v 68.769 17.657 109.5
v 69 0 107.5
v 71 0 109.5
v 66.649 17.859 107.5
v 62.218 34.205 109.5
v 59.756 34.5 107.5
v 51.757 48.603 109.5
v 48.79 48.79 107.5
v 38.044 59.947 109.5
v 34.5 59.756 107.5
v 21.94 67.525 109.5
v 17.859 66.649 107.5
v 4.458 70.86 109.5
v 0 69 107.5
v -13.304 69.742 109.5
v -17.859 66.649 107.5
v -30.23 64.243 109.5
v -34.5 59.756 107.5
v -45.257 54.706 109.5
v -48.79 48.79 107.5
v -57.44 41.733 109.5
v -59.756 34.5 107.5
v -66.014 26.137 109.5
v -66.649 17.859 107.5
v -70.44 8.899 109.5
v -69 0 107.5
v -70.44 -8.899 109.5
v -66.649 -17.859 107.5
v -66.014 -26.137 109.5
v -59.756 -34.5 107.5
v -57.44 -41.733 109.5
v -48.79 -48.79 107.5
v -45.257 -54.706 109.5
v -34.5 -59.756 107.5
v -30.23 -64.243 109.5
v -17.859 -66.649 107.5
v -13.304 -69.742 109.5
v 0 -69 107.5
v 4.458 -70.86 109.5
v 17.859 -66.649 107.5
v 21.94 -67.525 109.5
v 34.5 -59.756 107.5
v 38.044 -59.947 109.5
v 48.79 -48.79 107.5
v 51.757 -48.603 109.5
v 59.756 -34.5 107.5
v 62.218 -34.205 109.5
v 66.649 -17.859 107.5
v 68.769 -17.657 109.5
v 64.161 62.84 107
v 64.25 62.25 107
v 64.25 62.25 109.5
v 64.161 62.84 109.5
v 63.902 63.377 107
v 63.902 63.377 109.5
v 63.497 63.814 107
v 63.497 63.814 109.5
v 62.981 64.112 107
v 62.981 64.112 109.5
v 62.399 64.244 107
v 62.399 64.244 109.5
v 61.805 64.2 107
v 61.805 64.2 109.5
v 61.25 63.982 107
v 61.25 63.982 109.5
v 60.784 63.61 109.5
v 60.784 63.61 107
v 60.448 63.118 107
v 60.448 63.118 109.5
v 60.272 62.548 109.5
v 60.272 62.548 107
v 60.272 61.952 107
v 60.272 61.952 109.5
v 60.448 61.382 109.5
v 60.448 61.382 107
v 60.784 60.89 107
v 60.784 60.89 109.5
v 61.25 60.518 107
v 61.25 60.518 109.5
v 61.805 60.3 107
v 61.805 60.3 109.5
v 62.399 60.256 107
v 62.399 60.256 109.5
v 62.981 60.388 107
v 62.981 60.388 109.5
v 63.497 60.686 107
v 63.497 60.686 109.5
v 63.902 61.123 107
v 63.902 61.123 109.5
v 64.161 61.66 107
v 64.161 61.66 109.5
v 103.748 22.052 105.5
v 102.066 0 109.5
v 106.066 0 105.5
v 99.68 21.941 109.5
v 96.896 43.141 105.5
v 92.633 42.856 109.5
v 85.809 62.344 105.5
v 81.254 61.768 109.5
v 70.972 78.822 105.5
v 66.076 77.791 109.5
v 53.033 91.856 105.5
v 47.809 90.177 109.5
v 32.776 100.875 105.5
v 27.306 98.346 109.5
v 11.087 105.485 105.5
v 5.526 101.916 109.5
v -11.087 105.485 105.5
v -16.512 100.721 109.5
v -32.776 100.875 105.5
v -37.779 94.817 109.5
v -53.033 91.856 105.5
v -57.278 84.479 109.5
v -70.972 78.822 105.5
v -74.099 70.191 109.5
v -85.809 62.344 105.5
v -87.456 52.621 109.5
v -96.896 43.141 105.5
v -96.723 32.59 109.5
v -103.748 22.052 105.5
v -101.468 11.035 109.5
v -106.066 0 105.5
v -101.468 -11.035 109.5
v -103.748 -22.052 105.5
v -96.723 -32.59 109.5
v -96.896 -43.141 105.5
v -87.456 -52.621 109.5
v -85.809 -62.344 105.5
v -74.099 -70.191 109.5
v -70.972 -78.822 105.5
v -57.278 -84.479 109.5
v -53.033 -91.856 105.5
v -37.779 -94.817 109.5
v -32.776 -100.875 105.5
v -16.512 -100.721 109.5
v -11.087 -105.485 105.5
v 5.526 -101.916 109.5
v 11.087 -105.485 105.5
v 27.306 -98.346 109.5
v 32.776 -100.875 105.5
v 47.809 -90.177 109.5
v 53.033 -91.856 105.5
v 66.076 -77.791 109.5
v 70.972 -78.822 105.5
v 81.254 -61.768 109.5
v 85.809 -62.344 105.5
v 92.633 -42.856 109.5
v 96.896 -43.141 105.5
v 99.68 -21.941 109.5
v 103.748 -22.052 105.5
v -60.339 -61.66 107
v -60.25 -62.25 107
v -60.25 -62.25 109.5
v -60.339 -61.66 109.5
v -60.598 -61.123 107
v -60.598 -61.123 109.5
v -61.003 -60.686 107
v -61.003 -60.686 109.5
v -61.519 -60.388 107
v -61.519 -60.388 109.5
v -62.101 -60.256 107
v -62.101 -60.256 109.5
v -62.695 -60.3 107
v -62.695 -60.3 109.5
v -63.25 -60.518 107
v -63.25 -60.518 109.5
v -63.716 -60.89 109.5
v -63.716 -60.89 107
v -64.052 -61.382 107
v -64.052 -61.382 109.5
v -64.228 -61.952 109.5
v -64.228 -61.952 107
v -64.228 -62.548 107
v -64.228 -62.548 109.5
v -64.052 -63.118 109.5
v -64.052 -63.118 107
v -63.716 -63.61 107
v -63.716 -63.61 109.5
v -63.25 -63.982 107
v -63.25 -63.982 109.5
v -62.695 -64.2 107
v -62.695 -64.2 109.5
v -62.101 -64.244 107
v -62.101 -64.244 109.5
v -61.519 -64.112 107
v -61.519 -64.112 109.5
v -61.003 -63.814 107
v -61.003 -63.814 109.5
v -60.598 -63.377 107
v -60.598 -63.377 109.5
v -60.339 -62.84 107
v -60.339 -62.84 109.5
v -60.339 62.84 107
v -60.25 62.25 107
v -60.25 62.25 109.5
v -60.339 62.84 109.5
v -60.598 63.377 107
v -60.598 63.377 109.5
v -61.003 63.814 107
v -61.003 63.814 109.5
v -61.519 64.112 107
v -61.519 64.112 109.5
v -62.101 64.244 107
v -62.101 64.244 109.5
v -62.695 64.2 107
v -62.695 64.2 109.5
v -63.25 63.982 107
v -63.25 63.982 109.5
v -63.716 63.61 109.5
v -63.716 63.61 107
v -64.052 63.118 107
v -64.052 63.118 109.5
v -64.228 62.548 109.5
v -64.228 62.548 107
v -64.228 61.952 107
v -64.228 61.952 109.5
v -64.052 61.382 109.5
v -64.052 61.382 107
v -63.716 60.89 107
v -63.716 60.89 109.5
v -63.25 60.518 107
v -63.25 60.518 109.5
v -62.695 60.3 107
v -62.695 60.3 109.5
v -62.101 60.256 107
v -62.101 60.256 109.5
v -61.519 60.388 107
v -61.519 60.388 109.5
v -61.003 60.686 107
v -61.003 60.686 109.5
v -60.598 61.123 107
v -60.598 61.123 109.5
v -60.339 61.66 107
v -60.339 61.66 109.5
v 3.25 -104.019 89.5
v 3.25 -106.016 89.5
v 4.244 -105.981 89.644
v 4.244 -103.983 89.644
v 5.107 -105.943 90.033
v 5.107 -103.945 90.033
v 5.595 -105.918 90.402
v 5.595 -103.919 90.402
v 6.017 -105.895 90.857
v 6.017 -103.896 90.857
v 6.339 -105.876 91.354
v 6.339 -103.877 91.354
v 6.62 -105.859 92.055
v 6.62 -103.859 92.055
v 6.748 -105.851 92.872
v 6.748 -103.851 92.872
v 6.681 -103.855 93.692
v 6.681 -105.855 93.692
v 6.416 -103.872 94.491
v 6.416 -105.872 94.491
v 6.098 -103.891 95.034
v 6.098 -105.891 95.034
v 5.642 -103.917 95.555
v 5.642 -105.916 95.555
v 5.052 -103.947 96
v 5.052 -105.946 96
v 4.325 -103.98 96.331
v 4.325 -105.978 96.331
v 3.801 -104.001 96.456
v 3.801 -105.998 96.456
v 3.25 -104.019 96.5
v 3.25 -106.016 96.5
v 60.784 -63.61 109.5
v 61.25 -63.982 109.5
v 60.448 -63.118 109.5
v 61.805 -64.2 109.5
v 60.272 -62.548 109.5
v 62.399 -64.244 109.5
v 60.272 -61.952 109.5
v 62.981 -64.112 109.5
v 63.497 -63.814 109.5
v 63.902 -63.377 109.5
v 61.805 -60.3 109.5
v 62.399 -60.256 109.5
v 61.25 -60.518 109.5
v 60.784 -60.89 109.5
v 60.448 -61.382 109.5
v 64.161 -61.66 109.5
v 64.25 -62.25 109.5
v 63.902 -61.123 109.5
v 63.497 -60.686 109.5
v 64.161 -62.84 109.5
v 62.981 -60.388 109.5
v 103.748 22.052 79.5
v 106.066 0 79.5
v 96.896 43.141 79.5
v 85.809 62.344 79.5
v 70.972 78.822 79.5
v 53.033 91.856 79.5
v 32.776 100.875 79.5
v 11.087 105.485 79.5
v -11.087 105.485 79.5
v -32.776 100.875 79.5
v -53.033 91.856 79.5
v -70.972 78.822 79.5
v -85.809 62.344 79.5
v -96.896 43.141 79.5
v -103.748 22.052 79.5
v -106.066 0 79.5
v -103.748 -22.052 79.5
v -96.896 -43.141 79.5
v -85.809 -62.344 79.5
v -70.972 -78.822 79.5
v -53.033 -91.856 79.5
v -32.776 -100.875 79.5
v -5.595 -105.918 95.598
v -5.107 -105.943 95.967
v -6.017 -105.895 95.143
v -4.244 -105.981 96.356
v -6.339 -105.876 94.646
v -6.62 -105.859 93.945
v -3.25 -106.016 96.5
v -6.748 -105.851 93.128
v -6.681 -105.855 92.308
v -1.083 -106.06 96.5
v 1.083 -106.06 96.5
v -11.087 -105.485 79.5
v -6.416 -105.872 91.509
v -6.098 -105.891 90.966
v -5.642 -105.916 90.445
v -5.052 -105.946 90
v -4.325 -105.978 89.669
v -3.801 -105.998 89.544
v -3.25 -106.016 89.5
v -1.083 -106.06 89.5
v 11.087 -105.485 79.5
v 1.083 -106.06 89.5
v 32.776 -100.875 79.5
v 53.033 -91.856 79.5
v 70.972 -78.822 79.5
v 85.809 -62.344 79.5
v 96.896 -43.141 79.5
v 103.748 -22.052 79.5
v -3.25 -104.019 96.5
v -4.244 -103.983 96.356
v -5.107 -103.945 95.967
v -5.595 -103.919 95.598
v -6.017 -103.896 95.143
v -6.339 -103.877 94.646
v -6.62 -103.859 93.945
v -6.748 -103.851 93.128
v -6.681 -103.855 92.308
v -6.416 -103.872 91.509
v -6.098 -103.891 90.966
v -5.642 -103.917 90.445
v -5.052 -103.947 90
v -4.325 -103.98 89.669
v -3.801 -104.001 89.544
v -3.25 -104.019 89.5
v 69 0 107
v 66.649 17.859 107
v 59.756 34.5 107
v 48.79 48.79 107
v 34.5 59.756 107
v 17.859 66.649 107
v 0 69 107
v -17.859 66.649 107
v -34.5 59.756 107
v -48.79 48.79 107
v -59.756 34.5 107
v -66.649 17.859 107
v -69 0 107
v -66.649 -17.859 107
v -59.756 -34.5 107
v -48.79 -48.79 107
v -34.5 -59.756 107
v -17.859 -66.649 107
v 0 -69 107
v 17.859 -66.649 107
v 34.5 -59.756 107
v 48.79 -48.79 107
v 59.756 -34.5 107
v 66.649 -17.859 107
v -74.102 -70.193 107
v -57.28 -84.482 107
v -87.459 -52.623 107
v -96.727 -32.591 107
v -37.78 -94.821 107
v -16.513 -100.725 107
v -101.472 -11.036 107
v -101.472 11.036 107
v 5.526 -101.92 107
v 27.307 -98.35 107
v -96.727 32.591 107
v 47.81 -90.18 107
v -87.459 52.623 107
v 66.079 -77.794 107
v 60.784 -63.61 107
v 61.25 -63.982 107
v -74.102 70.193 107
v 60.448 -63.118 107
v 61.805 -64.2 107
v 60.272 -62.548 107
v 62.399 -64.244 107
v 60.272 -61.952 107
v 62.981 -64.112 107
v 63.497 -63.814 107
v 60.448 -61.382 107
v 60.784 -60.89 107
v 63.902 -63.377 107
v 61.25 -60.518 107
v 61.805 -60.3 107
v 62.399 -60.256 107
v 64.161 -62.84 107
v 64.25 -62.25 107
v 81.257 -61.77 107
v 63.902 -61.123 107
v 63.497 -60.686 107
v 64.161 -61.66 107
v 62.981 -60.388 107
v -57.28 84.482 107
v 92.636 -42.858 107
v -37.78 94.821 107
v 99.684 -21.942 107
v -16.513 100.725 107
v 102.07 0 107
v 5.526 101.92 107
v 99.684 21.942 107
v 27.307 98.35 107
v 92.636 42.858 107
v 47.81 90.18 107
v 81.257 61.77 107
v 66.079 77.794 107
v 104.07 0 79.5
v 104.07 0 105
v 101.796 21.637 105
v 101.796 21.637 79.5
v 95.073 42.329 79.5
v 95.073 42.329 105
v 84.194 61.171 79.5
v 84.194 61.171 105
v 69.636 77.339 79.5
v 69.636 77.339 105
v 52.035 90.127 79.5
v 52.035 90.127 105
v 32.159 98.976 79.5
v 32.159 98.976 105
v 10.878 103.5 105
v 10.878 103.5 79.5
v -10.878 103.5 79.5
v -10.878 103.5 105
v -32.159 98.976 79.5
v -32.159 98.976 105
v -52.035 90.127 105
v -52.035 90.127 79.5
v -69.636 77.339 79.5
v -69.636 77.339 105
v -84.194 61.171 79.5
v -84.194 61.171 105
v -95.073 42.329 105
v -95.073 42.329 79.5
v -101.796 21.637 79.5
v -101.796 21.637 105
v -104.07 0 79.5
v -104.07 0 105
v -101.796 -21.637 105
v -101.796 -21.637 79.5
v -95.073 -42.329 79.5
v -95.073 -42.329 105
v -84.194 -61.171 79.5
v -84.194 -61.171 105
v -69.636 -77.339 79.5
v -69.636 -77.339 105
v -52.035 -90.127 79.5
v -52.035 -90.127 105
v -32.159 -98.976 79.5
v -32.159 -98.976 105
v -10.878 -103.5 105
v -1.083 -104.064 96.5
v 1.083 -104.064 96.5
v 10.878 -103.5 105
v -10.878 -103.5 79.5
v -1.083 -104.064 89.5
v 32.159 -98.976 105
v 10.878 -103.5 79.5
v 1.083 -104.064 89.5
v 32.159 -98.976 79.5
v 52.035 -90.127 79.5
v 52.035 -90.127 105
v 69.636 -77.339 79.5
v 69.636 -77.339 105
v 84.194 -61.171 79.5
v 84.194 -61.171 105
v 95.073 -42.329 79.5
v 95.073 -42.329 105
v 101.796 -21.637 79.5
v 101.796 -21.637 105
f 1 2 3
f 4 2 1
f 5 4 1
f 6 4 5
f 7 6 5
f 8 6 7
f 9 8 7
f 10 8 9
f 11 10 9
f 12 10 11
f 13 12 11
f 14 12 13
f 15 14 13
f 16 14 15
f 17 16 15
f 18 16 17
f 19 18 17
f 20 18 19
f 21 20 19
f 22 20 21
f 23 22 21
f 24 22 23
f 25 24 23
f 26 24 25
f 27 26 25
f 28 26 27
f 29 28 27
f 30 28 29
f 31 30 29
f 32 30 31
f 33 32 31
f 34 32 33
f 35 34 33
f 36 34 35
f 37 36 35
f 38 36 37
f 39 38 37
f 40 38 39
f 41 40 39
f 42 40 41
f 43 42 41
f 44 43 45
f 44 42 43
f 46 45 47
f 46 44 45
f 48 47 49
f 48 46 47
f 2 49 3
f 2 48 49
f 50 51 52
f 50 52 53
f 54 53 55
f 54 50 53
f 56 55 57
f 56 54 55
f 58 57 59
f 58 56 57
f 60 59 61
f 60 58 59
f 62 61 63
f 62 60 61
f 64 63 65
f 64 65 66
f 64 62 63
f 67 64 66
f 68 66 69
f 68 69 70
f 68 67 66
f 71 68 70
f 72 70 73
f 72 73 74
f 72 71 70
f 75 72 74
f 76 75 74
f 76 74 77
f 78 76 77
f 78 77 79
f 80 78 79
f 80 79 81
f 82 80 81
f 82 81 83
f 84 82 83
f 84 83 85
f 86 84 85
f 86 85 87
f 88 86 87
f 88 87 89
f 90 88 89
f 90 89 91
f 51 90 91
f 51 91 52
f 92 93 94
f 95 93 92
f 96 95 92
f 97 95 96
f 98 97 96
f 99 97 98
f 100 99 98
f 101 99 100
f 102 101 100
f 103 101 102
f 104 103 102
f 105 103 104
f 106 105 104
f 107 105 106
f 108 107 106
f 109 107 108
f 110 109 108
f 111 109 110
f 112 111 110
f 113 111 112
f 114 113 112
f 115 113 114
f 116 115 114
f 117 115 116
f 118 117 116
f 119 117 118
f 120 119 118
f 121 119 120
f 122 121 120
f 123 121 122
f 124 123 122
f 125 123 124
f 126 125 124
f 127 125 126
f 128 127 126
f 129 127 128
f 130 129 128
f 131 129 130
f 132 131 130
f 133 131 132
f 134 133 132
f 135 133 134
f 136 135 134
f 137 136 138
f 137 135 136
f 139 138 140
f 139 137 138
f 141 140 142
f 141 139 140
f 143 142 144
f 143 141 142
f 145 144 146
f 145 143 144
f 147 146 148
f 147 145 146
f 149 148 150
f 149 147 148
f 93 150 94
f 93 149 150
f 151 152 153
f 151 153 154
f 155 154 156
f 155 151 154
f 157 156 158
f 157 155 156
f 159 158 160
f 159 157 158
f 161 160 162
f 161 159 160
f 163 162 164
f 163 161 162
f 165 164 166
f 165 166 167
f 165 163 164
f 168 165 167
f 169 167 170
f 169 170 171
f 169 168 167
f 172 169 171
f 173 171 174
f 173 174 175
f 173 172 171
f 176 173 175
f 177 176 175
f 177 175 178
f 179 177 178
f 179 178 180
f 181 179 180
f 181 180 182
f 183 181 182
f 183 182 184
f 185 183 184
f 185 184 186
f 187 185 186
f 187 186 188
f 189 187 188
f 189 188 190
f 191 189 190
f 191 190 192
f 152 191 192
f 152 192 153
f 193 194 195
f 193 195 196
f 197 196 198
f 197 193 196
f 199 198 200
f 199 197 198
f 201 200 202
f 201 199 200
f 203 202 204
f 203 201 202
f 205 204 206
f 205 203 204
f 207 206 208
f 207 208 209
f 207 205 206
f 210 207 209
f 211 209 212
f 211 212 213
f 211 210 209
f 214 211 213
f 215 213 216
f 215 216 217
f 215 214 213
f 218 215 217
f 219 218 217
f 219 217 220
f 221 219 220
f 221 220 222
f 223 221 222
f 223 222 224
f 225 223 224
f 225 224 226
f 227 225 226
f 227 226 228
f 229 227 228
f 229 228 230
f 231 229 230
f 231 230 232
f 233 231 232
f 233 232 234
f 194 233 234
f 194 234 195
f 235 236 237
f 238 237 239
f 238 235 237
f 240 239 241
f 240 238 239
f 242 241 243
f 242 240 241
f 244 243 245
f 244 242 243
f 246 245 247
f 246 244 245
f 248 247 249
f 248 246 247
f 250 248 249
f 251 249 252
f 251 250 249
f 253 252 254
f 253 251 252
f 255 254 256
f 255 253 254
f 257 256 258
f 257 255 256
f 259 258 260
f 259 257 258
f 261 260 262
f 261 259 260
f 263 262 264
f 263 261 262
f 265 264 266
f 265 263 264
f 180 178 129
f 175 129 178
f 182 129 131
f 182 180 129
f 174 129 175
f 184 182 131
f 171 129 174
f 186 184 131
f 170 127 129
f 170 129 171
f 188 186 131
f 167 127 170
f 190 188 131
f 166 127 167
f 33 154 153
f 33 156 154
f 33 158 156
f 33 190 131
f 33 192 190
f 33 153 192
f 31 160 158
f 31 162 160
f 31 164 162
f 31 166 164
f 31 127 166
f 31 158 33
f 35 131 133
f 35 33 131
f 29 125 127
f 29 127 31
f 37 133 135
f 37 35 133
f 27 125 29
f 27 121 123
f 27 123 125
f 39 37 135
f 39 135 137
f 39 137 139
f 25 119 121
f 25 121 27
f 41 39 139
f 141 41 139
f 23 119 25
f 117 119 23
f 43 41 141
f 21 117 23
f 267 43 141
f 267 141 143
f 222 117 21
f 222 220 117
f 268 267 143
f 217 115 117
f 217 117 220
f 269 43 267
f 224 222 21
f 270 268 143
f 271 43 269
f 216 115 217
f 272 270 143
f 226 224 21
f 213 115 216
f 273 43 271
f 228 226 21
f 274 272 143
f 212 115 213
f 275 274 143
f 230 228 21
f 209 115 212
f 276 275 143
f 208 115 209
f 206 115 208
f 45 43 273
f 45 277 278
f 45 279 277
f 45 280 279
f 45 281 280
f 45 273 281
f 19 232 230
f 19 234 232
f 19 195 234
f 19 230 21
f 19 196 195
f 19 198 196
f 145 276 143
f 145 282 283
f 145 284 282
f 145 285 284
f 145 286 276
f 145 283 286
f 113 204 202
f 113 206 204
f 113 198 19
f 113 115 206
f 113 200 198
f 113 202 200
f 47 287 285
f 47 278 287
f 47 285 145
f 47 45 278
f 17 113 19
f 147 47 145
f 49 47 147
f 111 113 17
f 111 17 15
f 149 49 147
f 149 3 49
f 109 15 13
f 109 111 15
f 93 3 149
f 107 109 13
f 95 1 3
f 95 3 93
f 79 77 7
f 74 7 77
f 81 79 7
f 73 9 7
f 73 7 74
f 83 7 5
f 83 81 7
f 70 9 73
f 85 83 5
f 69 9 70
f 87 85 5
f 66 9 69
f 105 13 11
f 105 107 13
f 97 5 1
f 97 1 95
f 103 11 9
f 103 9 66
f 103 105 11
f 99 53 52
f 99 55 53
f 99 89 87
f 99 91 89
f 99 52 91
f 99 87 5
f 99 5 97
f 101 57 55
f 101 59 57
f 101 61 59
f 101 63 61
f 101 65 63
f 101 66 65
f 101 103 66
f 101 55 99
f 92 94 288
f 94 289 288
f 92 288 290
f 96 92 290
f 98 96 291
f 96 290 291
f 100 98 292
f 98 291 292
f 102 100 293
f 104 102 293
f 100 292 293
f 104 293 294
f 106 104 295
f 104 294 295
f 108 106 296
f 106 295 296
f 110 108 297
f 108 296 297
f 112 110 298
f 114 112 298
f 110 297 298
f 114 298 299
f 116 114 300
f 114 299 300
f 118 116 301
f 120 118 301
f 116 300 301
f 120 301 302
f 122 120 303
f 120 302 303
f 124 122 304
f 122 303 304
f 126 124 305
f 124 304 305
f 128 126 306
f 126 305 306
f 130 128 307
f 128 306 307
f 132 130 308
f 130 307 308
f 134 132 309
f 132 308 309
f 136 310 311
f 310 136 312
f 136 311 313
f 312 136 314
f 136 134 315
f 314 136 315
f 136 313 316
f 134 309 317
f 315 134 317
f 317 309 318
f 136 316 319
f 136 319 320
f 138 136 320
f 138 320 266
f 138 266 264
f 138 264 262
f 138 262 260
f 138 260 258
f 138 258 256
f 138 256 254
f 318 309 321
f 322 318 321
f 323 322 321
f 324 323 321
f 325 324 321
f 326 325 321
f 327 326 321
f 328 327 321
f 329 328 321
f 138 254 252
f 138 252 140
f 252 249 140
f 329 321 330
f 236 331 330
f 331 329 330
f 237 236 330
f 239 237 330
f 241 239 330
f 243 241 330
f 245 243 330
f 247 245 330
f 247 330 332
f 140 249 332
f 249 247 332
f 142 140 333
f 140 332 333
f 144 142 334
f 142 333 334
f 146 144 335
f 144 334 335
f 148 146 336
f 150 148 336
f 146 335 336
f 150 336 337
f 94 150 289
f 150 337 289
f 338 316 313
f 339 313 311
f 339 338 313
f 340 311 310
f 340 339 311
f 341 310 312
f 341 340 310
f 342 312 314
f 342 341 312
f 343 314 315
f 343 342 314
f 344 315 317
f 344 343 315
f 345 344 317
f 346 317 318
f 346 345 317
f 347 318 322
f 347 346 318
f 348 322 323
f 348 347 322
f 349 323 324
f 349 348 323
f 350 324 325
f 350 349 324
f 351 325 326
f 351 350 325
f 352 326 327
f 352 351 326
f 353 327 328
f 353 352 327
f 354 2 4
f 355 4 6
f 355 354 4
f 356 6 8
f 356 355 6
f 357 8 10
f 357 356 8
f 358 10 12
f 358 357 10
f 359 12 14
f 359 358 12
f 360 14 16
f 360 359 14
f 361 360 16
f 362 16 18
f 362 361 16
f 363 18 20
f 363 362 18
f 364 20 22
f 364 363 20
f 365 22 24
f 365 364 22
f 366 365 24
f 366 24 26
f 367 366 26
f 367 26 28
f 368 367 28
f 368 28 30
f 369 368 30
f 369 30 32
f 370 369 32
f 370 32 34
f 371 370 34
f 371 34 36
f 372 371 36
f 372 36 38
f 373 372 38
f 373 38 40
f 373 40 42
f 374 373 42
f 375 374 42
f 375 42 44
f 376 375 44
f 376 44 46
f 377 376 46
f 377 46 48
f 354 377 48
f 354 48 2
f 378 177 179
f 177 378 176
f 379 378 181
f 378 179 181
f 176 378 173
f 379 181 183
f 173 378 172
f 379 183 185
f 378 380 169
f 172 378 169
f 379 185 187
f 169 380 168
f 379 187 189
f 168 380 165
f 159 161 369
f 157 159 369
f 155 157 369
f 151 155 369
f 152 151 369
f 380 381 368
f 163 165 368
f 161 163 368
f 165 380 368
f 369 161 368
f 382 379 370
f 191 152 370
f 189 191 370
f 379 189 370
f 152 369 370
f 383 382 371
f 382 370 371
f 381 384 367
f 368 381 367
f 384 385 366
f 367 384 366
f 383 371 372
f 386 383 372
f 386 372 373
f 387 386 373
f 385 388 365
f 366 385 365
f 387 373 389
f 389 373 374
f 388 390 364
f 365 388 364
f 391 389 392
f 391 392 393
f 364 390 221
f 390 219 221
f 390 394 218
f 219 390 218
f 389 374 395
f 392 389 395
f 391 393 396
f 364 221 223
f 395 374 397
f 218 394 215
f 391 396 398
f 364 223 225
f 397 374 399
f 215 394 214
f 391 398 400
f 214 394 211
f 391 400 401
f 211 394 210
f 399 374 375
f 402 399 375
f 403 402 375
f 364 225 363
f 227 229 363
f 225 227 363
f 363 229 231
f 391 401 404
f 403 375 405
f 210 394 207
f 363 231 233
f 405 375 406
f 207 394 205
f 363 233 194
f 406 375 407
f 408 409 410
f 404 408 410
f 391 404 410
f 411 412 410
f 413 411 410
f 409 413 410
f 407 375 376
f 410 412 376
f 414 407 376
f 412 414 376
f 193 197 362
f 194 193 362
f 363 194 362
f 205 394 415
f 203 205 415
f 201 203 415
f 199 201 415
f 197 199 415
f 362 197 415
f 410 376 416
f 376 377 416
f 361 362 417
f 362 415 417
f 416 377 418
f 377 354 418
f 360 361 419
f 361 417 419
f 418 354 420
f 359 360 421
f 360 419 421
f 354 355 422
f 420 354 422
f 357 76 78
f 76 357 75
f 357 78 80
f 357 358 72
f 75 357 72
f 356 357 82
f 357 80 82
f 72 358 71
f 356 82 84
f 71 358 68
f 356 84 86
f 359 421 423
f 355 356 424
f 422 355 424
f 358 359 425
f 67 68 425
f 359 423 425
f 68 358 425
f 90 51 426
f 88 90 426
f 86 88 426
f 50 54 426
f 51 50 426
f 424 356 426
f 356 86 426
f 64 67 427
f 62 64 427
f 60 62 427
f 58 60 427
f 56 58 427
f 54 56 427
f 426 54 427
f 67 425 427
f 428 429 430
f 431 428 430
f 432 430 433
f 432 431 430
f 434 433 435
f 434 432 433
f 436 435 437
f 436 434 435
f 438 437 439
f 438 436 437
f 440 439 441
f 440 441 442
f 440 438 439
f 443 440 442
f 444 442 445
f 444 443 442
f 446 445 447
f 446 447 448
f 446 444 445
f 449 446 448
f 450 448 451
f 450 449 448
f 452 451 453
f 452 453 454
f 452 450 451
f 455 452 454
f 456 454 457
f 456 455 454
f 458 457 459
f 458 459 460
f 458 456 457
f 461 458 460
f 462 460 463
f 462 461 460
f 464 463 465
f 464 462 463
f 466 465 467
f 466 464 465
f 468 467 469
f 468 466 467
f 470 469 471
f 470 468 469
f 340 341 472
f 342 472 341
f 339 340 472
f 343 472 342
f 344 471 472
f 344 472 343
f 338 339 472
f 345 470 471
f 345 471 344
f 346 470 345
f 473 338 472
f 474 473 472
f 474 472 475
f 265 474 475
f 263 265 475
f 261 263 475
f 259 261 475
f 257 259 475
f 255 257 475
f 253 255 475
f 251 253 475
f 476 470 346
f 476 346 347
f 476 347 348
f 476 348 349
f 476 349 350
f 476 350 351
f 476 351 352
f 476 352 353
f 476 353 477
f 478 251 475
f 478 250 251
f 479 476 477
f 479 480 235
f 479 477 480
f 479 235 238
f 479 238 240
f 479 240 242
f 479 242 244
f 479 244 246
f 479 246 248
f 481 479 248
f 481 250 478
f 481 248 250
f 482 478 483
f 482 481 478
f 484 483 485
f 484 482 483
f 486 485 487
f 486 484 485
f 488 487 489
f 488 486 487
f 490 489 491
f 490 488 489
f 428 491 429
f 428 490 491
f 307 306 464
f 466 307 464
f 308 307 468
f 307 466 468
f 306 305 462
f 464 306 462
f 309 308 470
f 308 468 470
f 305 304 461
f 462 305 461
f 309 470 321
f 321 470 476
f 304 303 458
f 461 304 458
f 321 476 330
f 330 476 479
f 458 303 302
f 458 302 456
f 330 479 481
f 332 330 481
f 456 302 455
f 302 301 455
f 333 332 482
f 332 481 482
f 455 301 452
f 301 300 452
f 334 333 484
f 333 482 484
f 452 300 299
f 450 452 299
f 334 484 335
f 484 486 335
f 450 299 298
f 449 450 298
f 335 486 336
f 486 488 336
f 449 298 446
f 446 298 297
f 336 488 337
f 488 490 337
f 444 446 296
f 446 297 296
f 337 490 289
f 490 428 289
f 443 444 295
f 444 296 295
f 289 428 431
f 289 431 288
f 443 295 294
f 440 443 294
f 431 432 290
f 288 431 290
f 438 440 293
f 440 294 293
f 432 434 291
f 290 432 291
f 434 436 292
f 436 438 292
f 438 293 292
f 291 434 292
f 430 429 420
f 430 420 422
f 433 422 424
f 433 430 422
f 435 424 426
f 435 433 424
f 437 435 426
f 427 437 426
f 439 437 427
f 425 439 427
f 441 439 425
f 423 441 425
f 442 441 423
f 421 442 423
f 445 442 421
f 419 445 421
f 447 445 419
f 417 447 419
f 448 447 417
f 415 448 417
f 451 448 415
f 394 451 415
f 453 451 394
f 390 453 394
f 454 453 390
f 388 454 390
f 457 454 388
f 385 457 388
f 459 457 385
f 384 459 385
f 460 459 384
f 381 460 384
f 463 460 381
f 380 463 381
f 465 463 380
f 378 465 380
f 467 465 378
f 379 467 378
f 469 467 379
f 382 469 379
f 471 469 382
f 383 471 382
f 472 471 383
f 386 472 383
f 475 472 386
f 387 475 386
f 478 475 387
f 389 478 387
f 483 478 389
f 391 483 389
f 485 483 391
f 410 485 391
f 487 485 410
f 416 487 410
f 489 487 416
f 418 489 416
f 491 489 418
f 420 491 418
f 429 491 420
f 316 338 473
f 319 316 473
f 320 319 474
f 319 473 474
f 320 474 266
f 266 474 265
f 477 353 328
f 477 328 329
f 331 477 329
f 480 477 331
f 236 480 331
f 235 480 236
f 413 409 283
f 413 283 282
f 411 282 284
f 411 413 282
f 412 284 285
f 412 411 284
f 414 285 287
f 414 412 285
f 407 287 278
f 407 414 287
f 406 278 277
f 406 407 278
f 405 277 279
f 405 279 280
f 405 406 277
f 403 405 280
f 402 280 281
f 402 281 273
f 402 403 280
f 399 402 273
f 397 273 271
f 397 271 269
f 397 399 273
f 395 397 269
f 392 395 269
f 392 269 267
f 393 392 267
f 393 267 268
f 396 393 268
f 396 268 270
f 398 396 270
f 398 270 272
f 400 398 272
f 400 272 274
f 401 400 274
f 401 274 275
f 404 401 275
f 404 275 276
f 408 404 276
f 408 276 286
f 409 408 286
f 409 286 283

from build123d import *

# Parameters (mm, degrees)
SKETCH_R        = 106.066017
SKETCH_R_2      = 2
SKETCH_R_3      = 69
PAD_DEPTH       = 30
SKETCH023_R     = 104.07
POCKET_DEPTH    = 27.5
CHAMFER_SIZE    = 4
CHAMFER011_SIZE = 2
CHAMFER014_SIZE = 2
POCKET005_DEPTH = 109


with BuildPart() as part:
    # Sketch → Pad (new body)
    with BuildSketch(Plane.XY):
        Circle(SKETCH_R)
        with Locations((-62.25, 62.25)):
            Circle(SKETCH_R_2, mode=Mode.SUBTRACT)
        with Locations((62.25, 62.25)):
            Circle(SKETCH_R_2, mode=Mode.SUBTRACT)
        with Locations((62.25, -62.25)):
            Circle(SKETCH_R_2, mode=Mode.SUBTRACT)
        with Locations((-62.25, -62.25)):
            Circle(SKETCH_R_2, mode=Mode.SUBTRACT)
        Circle(SKETCH_R_3, mode=Mode.SUBTRACT)
    extrude(amount=PAD_DEPTH)

    # Sketch023 → Pocket (cut)
    with BuildSketch(Plane.XY):
        Circle(SKETCH023_R)
    extrude(amount=POCKET_DEPTH, mode=Mode.SUBTRACT)

    # Chamfer
    chamfer_edges = [part.edges().sort_by_distance(p)[0] for p in [
        (-106.066017, 0, 30),
    ]]
    chamfer(chamfer_edges, length=CHAMFER_SIZE)

    # Chamfer011
    chamfer011_edges = [part.edges().sort_by_distance(p)[0] for p in [
        (-69, 0, 30),
    ]]
    chamfer(chamfer011_edges, length=CHAMFER011_SIZE)

    # Chamfer014
    chamfer014_edges = [part.edges().sort_by_distance(p)[0] for p in [
        (-104.07, 0, 27.5),
    ]]
    chamfer(chamfer014_edges, length=CHAMFER014_SIZE)

    # Sketch027 → Pocket005 (cut)
    with BuildSketch(Plane.XZ):
        with BuildLine():
            ThreePointArc((-3.250001, 17), (-6.75, 13.499999), (-3.249999, 10))
            Line((-3.249999, 10), (3.250001, 10))
            ThreePointArc((3.250001, 10), (6.75, 13.500001), (3.249999, 17))
            Line((-3.250001, 17), (3.249999, 17))
        make_face()
    extrude(amount=POCKET005_DEPTH, mode=Mode.SUBTRACT)


with BuildPart() as part_1:
    # Body placement: moved
    add(part.part.moved(Location((0, 0, 79.5))))


solid = part_1.part
